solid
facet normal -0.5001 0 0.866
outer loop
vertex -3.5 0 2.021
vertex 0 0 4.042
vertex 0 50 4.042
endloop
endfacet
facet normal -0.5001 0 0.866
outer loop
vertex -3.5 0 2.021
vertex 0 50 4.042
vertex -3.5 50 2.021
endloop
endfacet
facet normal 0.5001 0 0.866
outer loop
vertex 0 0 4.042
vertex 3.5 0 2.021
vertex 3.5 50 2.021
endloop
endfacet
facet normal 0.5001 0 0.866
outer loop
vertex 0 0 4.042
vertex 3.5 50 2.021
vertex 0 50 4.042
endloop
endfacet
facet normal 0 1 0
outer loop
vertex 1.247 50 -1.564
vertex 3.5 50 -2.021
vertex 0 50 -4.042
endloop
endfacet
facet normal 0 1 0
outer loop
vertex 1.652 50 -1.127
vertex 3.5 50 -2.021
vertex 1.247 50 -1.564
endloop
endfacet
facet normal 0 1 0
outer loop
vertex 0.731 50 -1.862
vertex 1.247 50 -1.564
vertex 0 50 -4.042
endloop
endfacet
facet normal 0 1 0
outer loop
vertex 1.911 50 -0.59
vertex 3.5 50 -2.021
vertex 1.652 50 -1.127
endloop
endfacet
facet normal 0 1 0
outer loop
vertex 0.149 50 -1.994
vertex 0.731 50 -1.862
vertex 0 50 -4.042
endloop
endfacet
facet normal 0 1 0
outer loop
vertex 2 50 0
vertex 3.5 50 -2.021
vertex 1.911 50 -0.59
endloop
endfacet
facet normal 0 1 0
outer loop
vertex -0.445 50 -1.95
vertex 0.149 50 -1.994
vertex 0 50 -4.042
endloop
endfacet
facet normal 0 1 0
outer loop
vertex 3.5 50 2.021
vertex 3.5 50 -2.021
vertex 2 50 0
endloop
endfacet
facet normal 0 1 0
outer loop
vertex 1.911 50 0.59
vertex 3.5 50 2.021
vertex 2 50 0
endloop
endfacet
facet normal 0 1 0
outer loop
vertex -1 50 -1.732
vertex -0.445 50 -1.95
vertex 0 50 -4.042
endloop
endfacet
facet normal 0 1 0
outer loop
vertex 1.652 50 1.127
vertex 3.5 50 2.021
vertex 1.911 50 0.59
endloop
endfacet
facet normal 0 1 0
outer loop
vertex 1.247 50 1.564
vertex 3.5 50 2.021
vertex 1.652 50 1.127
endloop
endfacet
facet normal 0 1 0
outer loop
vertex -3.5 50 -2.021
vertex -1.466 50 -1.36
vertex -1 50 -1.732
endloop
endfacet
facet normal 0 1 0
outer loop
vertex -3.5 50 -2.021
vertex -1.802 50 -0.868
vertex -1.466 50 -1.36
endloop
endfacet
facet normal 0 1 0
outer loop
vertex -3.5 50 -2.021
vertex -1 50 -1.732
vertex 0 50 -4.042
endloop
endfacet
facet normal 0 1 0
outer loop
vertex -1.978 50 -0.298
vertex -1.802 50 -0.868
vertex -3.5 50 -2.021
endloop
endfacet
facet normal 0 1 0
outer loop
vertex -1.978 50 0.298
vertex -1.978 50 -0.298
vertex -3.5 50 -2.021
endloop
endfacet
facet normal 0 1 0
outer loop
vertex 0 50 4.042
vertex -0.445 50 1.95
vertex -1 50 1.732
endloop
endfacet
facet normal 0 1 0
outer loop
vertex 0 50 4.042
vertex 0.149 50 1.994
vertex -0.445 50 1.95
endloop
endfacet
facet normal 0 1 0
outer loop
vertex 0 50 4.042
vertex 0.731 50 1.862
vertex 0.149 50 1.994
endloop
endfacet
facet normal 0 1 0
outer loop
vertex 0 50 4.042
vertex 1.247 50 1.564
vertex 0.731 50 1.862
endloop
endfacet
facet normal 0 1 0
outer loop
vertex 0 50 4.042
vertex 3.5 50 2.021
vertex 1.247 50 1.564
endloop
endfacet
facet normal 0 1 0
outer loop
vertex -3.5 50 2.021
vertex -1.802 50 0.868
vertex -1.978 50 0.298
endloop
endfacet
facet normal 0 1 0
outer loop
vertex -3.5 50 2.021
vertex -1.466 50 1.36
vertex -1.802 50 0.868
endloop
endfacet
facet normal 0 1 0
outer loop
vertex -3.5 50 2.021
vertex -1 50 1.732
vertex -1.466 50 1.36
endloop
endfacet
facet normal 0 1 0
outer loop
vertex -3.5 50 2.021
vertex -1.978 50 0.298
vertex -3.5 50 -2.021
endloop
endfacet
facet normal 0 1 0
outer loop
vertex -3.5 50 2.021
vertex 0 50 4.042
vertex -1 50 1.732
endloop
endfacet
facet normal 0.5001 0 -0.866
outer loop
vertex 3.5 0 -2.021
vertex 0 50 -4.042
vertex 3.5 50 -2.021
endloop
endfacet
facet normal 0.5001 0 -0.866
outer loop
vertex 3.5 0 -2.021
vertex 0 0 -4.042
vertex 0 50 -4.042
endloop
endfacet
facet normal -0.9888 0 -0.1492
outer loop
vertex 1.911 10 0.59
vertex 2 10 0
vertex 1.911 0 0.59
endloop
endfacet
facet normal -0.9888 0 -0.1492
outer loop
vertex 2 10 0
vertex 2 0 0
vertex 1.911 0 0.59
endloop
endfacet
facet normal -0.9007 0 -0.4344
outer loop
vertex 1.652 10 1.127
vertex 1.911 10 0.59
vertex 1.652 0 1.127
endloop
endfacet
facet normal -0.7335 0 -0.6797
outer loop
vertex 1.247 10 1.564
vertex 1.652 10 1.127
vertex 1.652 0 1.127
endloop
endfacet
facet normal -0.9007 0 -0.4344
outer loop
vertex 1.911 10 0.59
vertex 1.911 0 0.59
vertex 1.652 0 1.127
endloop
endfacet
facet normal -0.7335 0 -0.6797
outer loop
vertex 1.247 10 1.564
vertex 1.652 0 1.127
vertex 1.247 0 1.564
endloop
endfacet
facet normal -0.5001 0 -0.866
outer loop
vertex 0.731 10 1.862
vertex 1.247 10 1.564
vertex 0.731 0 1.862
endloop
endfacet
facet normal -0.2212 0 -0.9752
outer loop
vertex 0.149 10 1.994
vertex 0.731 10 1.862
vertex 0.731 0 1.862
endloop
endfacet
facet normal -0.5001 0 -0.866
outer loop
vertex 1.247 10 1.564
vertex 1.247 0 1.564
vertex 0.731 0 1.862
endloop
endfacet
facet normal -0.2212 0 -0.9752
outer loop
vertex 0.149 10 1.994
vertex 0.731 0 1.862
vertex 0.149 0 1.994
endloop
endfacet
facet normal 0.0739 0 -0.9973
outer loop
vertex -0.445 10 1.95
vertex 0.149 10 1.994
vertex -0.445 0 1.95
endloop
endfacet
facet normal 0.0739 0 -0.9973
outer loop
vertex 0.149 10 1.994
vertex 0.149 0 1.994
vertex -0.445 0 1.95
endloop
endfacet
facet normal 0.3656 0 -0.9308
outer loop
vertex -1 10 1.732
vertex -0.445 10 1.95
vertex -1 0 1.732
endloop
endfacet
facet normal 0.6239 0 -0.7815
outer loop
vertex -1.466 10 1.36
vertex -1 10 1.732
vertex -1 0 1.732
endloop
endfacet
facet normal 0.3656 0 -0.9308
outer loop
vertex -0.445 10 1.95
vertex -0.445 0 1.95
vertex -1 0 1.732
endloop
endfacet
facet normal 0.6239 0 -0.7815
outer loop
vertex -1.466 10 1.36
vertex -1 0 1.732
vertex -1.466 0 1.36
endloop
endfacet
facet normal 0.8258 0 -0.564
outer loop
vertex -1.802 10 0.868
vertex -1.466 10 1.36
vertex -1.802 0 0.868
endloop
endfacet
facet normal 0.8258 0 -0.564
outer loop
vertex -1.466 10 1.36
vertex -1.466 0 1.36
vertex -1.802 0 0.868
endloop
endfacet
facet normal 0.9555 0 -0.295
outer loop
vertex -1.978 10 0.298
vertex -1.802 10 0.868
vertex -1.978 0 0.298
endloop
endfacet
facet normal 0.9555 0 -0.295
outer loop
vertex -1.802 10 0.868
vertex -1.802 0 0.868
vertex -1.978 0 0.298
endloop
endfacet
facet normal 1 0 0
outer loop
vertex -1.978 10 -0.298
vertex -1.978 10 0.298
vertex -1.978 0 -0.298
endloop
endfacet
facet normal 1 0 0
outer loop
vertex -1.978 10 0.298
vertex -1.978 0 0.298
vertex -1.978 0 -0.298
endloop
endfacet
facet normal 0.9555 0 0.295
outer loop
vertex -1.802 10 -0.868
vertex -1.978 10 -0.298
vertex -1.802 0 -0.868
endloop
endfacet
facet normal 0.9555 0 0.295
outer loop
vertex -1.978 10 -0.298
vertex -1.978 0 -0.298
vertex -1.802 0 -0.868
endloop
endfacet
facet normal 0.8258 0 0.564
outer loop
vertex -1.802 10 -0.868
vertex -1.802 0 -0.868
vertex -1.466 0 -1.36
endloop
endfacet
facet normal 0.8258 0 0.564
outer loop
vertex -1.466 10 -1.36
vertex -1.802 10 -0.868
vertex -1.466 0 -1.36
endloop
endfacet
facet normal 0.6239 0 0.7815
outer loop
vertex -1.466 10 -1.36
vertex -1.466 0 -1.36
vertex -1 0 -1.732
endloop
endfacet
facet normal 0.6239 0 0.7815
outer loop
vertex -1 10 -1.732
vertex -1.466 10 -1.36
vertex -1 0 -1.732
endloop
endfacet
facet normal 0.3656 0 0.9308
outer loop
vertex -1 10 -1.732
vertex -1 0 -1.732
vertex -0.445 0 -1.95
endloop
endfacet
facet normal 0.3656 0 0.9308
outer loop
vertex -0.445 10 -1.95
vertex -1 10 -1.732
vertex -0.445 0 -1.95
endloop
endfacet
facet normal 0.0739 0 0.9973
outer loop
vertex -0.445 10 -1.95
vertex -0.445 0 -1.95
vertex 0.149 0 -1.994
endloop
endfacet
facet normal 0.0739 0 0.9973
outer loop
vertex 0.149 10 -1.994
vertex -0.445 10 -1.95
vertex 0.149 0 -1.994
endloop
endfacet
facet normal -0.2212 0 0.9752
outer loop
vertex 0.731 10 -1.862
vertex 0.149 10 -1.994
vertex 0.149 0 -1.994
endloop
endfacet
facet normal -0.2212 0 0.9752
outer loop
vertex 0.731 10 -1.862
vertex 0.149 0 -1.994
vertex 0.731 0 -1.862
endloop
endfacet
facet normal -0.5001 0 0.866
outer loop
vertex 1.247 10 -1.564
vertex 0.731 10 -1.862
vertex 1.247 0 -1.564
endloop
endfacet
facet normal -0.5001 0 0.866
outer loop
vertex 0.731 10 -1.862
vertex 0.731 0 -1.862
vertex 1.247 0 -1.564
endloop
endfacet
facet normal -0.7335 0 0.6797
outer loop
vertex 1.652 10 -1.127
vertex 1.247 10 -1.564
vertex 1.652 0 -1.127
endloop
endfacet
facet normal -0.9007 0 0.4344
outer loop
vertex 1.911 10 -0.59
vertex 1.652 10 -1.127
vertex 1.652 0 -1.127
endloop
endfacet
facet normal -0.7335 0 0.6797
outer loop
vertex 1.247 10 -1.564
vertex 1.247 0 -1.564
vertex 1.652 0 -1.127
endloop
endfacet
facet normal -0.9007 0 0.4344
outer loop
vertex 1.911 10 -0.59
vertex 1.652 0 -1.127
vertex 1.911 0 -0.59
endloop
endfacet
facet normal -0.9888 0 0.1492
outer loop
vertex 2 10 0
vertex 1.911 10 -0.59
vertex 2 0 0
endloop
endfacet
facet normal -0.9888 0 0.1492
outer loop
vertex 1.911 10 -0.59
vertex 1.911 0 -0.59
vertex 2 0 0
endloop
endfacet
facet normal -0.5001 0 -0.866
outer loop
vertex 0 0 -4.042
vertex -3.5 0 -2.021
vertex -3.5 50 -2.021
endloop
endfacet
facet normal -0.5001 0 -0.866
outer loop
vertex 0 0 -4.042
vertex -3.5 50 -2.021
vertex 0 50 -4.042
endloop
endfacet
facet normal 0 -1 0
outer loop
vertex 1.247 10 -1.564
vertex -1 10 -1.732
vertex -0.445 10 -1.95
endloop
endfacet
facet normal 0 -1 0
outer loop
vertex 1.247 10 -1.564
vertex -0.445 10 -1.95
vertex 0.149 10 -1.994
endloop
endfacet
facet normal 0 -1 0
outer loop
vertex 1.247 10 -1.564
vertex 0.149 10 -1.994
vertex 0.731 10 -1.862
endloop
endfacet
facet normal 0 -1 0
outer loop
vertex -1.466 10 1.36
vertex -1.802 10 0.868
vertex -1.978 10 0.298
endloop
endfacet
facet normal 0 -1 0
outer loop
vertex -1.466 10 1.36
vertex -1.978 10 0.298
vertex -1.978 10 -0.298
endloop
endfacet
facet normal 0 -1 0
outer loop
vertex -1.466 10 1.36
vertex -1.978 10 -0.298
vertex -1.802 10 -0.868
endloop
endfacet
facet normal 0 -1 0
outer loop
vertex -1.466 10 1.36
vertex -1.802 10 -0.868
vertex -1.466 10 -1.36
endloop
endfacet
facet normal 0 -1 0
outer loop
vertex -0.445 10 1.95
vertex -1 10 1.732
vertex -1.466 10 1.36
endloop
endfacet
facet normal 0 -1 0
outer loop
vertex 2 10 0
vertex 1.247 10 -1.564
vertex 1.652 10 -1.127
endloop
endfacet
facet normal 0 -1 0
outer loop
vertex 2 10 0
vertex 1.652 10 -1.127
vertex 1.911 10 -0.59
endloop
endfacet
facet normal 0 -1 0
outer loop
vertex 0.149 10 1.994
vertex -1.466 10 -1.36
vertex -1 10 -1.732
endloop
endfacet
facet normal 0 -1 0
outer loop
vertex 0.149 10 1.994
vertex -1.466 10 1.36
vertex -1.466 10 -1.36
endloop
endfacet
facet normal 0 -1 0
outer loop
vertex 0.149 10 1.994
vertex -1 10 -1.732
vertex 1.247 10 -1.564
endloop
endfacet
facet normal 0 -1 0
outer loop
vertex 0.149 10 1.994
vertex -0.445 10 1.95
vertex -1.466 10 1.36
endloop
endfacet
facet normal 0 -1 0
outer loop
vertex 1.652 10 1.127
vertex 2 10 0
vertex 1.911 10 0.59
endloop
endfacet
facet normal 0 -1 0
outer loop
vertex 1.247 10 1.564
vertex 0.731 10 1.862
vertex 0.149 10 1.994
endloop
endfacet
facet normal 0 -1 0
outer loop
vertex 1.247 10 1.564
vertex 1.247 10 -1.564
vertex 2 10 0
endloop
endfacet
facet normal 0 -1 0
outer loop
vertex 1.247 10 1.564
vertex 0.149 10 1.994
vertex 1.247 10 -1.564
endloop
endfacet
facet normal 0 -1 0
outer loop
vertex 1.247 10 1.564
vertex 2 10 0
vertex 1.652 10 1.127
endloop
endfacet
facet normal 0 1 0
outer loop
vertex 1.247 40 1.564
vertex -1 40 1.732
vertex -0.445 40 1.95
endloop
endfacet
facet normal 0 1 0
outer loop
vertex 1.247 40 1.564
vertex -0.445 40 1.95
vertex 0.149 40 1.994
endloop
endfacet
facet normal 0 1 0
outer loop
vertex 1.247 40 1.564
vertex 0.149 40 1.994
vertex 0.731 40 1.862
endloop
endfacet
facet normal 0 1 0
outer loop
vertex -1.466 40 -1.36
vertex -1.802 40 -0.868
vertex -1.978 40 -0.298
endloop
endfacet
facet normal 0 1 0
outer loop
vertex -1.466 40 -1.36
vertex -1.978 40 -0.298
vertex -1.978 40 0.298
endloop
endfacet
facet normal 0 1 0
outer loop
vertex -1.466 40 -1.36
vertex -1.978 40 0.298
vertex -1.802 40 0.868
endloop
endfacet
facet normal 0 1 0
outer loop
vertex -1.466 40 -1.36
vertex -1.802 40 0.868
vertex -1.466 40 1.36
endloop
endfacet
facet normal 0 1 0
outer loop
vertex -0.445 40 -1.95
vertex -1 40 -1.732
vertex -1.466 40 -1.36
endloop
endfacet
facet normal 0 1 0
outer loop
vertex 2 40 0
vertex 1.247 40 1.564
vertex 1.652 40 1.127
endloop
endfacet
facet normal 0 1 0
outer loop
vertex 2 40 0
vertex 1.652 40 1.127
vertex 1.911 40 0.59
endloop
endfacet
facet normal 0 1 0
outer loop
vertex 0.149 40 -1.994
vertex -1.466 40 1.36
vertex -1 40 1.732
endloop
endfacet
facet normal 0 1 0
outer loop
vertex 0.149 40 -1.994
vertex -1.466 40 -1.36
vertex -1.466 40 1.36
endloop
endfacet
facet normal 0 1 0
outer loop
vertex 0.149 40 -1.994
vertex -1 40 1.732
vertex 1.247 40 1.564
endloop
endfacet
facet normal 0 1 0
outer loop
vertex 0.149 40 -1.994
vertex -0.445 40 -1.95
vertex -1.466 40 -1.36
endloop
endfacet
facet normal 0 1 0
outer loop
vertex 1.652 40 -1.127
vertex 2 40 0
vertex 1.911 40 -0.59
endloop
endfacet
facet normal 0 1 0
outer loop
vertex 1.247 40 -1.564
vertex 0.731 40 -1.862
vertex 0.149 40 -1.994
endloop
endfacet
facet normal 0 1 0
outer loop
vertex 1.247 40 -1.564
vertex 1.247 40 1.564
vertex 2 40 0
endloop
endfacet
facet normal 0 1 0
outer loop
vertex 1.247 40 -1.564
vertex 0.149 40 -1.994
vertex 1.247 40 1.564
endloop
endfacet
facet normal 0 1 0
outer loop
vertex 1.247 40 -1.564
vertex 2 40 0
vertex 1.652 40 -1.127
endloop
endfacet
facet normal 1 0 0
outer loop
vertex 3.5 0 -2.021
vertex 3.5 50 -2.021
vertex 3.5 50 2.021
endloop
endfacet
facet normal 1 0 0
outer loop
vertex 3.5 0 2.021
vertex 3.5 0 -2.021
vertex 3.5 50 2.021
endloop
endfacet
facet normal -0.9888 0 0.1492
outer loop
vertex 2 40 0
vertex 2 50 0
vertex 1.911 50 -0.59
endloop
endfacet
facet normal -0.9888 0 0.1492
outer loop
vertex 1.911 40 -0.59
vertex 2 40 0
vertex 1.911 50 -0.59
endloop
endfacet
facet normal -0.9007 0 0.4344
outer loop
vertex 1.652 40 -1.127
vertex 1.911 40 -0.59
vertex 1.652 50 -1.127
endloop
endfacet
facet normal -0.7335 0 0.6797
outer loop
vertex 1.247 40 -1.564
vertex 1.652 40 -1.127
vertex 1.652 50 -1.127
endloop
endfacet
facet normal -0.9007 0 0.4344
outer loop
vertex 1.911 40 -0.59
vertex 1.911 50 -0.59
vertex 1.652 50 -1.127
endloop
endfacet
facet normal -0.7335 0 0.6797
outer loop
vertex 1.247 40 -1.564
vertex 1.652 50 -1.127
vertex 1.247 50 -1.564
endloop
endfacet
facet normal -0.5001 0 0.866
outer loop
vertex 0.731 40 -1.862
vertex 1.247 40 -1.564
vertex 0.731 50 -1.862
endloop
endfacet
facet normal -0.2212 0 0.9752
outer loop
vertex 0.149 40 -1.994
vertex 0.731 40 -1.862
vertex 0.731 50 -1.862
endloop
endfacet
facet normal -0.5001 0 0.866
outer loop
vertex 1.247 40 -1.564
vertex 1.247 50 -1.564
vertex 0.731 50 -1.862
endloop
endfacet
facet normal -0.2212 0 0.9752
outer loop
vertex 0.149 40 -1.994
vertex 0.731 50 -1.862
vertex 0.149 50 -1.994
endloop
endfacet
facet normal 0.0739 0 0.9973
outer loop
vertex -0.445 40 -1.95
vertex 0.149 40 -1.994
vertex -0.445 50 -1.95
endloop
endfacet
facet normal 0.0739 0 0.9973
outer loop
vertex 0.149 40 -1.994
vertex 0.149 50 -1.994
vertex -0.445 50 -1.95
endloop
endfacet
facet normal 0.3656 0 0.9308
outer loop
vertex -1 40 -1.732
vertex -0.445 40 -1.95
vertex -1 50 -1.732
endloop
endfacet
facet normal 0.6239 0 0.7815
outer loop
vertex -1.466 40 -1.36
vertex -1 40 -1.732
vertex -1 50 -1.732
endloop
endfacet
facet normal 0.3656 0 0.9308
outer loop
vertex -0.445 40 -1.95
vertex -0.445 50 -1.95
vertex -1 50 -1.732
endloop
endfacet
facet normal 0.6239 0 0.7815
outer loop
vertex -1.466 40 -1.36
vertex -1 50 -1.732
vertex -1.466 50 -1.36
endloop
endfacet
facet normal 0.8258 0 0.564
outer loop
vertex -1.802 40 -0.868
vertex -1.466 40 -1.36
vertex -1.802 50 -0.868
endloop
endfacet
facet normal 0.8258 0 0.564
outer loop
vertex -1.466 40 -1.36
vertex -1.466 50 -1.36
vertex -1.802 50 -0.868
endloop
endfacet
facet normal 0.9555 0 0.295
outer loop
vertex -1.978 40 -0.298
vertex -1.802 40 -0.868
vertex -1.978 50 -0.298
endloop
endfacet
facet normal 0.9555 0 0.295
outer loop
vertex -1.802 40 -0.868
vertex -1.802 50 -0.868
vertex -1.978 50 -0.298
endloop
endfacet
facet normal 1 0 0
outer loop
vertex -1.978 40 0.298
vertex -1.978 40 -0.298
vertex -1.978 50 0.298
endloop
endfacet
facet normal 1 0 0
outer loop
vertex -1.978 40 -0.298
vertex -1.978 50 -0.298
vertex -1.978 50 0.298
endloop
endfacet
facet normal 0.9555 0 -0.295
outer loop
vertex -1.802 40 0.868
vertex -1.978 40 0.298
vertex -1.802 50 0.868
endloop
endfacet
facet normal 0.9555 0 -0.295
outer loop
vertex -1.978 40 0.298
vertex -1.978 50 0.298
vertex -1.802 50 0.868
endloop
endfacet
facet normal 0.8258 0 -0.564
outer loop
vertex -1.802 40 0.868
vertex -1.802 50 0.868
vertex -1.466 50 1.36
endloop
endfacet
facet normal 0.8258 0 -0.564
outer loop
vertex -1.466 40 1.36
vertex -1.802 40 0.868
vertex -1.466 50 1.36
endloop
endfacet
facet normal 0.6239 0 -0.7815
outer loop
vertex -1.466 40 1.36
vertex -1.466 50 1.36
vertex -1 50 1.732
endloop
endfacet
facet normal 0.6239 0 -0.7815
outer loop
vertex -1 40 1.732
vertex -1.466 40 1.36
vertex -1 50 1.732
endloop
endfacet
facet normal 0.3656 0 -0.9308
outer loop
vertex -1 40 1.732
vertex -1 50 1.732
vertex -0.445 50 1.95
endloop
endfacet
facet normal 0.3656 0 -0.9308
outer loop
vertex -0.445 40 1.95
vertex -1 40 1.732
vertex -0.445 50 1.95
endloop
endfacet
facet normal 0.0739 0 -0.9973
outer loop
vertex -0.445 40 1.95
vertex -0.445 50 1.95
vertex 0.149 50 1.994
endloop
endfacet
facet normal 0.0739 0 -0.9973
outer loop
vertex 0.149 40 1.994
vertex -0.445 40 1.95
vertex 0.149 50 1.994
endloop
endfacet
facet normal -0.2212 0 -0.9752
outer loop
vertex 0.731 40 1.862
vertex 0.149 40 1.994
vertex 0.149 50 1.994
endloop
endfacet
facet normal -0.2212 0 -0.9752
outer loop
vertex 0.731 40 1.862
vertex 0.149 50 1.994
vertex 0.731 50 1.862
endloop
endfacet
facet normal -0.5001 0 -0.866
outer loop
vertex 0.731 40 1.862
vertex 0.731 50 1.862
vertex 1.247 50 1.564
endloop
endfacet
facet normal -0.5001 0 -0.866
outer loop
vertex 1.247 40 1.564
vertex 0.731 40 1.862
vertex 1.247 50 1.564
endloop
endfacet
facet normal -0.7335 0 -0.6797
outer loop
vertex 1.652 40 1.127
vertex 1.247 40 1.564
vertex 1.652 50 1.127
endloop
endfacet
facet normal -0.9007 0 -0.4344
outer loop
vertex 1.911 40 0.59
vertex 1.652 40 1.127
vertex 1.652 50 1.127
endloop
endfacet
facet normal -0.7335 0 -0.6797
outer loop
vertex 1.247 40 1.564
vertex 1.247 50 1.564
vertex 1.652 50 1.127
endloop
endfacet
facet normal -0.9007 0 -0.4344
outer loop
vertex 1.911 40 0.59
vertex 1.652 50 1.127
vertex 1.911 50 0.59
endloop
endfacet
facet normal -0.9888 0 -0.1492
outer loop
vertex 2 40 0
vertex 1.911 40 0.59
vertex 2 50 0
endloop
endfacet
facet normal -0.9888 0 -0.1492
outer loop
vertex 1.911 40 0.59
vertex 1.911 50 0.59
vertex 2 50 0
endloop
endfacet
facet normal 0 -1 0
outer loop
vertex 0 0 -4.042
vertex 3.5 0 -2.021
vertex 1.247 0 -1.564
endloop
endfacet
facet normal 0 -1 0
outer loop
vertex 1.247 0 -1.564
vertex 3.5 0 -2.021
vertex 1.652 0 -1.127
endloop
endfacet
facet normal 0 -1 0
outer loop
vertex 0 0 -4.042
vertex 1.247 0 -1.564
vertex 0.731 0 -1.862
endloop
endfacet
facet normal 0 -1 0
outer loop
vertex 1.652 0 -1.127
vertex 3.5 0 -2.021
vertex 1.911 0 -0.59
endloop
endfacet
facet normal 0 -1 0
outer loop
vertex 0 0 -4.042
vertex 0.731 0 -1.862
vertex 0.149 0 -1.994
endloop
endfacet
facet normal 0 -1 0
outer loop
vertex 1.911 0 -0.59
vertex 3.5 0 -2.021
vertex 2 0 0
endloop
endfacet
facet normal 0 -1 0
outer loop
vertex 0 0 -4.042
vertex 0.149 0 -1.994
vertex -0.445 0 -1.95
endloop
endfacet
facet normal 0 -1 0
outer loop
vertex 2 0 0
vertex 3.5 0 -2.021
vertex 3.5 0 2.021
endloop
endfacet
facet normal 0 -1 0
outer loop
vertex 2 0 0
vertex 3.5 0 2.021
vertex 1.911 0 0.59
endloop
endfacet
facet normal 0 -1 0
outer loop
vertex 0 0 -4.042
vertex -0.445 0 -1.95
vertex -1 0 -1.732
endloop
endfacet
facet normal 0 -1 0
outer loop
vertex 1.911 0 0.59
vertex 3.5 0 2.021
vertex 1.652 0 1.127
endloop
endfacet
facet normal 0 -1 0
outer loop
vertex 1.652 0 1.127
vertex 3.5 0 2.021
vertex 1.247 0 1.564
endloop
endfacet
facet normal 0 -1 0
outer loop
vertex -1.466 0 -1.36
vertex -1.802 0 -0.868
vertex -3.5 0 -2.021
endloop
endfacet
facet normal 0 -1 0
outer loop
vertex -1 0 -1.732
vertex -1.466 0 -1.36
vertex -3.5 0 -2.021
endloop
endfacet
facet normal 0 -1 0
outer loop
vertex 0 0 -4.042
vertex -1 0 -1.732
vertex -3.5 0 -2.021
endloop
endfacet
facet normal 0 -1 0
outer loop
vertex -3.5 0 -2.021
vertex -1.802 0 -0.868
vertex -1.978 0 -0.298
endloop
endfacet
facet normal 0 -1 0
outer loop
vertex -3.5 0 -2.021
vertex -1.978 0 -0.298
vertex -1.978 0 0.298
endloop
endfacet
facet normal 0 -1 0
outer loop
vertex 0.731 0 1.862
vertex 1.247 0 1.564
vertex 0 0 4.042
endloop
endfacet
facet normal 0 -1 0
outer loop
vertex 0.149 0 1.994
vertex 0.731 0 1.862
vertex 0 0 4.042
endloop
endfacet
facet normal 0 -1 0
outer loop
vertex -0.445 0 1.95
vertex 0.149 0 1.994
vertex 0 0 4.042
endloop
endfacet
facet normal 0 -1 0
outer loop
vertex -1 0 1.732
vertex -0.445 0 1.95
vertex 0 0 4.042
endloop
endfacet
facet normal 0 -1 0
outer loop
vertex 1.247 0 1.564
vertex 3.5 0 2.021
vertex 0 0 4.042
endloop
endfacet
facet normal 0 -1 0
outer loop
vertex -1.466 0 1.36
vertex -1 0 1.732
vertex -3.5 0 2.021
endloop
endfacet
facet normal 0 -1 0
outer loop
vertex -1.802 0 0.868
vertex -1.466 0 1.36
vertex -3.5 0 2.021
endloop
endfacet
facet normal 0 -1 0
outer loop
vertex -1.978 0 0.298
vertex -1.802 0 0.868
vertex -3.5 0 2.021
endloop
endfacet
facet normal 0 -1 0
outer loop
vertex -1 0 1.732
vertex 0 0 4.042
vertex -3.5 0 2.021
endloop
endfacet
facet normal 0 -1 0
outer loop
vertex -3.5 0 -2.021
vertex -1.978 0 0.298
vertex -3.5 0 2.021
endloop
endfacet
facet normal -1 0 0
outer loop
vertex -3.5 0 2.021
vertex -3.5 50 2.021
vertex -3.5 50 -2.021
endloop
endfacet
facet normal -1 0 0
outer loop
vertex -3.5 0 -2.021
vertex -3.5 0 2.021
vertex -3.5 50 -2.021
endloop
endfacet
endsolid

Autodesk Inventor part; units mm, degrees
ref_plane "YZ Plane" through (0, 0, 0) normal (1, 0, 0) x (0, 1, 0)
ref_plane "XZ Plane" through (0, 0, 0) normal (0, 1, 0) x (-1, 0, 0)
ref_plane "XY Plane" through (0, 0, 0) normal (0, 0, 1) x (1, 0, 0)
sketch "Esquisse1" plane through (0, 0, 0) normal (0, 1, 0) x (-1, 0, 0)
  line L0 (0, -4.0415) -> (-3.5, -2.0207)
  line L1 (-3.5, -2.0207) -> (-3.5, 2.0207)
  line L2 (-3.5, 2.0207) -> (0, 4.0415)
  line L3 (0, 4.0415) -> (3.5, 2.0207)
  line L4 (3.5, 2.0207) -> (3.5, -2.0207)
  line L5 (3.5, -2.0207) -> (0, -4.0415)
  point P0 (0, 0)
  point P1 (0, 0)
  dimension "d0" = 7
extrude "Extrusion1" add sketch "Esquisse1" along normal blind 50
sketch "Esquisse2" plane through (0, 0, 0) normal (0, -1, 0) x (1, 0, 0)
  circle A0 centre (0, 0) radius 2
  dimension "d3" = 4
extrude "Extrusion2" cut sketch "Esquisse2" against normal blind 10
sketch "Esquisse3" plane through (0, 50, 0) normal (0, 1, 0) x (1, 0, 0)
  circle A0 centre (0, 0) radius 2
  dimension "d6" = 4
extrude "Extrusion3" cut sketch "Esquisse3" against normal blind 10
thread "Filetage1" size "M4x0.7" class "6H" standard "ANSI Metric M Profile" full length
thread "Filetage2" size "M4x0.7" class "6H" standard "ANSI Metric M Profile" full length
properties part number "Entretoise-50mm" material "Acier"
